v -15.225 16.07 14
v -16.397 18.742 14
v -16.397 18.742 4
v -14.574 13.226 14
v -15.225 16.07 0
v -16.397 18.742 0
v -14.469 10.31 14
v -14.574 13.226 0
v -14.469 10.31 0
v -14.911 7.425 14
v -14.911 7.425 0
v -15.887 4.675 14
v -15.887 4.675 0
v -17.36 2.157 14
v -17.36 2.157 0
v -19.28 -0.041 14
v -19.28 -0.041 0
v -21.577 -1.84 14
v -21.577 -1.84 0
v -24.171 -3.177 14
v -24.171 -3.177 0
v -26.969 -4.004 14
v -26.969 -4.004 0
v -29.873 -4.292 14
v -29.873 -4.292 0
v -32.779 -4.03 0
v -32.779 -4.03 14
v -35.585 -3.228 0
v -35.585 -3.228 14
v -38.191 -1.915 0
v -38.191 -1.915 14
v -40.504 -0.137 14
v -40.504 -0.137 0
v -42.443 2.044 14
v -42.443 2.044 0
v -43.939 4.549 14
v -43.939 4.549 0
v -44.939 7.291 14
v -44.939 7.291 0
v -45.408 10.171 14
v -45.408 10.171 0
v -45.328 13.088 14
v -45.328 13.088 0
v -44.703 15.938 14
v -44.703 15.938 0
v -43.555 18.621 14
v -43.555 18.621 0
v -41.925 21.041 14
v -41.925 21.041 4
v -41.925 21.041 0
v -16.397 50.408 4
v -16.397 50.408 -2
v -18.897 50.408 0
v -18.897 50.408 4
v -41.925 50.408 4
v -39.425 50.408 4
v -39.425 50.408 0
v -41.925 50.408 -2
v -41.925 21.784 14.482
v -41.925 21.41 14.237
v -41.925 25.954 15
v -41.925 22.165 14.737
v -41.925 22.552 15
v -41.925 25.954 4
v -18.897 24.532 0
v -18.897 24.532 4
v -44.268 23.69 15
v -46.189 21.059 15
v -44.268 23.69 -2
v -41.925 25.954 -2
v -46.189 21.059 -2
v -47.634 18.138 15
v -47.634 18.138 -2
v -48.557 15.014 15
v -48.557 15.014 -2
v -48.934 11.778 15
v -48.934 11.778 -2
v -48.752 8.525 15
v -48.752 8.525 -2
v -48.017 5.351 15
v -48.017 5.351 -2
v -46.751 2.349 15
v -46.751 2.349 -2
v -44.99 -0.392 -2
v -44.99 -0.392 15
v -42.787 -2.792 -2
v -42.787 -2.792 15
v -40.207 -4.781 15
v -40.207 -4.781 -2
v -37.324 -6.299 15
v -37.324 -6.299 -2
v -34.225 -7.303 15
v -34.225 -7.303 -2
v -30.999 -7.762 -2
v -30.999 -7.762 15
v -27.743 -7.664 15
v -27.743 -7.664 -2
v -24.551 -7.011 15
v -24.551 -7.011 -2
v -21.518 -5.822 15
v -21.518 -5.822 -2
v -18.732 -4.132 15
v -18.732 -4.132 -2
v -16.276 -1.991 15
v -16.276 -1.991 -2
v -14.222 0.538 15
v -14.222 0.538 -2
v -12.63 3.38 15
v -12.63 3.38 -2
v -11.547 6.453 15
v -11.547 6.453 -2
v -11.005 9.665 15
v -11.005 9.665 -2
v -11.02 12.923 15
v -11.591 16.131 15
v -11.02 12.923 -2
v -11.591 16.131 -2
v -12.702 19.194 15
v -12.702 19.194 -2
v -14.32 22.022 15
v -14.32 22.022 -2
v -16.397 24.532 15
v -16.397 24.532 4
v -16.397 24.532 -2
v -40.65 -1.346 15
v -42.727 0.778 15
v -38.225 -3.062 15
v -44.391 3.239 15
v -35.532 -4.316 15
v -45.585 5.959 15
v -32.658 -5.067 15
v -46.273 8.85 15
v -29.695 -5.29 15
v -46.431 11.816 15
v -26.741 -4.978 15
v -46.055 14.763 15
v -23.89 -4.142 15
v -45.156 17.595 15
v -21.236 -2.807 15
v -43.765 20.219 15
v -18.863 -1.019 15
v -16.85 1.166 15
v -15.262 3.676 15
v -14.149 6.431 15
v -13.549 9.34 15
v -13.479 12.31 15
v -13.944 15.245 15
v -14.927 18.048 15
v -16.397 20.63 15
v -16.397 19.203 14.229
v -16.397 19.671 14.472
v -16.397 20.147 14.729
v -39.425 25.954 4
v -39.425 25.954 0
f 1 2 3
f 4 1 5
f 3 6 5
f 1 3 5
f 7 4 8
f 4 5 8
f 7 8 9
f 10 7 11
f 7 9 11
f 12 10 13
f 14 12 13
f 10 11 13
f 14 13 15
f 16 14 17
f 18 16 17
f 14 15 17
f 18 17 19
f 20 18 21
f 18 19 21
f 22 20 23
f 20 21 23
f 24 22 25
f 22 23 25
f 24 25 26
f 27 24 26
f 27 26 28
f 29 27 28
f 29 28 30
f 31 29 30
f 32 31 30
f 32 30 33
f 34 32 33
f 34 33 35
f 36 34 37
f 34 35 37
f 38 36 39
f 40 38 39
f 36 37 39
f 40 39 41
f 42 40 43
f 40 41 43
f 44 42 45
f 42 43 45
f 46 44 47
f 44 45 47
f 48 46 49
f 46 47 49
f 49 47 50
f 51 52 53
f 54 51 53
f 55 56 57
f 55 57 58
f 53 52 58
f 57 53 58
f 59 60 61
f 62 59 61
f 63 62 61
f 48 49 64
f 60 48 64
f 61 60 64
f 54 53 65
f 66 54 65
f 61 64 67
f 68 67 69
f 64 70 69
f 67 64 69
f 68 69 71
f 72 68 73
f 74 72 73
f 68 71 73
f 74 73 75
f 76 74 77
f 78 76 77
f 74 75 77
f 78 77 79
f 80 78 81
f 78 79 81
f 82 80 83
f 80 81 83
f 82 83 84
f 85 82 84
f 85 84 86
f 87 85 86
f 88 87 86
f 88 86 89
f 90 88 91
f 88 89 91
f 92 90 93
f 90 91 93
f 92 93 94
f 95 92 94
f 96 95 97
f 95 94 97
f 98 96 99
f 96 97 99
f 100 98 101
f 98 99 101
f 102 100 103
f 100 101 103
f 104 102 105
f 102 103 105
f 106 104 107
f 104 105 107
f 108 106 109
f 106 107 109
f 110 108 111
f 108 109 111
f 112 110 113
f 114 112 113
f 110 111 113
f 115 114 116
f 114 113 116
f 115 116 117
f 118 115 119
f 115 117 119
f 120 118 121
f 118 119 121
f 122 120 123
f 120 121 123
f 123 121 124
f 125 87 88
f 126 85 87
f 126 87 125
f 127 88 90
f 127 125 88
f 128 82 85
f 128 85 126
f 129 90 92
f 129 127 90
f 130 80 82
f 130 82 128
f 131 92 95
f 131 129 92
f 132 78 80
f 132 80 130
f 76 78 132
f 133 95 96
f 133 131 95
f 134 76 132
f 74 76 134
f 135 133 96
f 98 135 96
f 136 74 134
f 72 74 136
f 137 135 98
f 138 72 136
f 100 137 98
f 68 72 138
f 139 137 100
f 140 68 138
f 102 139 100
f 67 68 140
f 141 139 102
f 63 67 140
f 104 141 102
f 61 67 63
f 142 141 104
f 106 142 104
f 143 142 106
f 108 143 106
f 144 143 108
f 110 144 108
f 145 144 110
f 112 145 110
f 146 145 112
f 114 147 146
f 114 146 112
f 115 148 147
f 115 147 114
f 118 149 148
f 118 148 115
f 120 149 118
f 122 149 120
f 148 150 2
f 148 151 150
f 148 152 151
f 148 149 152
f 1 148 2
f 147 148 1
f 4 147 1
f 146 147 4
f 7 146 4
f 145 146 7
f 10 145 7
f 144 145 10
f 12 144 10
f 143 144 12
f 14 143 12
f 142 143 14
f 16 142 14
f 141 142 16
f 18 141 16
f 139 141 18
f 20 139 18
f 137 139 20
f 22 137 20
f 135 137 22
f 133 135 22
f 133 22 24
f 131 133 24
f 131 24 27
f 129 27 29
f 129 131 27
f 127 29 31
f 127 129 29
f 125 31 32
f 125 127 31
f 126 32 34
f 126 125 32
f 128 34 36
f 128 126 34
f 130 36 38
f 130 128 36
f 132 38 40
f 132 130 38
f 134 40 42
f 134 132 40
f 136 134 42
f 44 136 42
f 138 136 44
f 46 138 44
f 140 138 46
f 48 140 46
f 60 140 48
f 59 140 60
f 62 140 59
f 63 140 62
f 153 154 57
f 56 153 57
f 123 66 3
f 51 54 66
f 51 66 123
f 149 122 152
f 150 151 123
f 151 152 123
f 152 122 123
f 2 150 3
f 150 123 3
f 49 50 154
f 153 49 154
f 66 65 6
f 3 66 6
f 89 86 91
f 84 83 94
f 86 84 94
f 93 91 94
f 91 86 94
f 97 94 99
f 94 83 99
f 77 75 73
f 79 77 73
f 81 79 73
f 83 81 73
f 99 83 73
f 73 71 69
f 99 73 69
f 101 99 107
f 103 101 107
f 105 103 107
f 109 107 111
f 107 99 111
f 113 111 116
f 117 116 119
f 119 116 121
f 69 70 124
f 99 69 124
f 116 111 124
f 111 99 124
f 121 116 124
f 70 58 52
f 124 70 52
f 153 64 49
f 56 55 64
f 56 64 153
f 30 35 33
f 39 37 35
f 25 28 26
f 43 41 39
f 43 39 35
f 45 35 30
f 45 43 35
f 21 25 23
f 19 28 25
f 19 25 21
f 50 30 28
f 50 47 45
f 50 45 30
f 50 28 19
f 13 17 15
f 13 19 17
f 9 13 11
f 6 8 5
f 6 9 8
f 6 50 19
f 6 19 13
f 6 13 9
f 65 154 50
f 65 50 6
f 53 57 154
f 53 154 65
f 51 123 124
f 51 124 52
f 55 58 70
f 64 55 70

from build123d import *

# Parameters (mm, degrees)
F1_DEPTH = 2
F2_DEPTH = 15
F4_DEPTH = 4
F5_SIZE  = 1


with BuildPart() as f1:
    # F0 (on Top) → F1 (new body)
    with BuildSketch(Plane.XY):
        with BuildLine():
            Line((-41.924741, 25.953611), (-41.924741, 21.040638))
            ThreePointArc((-41.924741, 21.040638), (-31.332281, -4.229339), (-16.396854, 18.742492))
            Line((-16.396854, 18.742492), (-16.396854, 24.531709))
            Line((-16.396854, 24.531709), (-16.396854, 50.408155))
            Line((-16.396854, 50.408155), (-41.924741, 50.408155))
            Line((-41.924741, 50.408155), (-41.924741, 25.953611))
        make_face()
        with BuildLine():
            ThreePointArc((-16.396854, 18.742492), (-31.332281, -4.229339), (-41.924741, 21.040638))
            Line((-41.924741, 21.040638), (-41.924741, 25.953611))
            ThreePointArc((-41.924741, 25.953611), (-30.999175, -7.762364), (-16.396854, 24.531709))
            Line((-16.396854, 24.531709), (-16.396854, 18.742492))
        make_face()
    extrude(amount=-F1_DEPTH)

    # F0 (on Top) → F2 (join)
    with BuildSketch(Plane.XY):
        with BuildLine():
            ThreePointArc((-16.396854, 18.742492), (-31.332281, -4.229339), (-41.924741, 21.040638))
            Line((-41.924741, 21.040638), (-41.924741, 25.953611))
            ThreePointArc((-41.924741, 25.953611), (-30.999175, -7.762364), (-16.396854, 24.531709))
            Line((-16.396854, 24.531709), (-16.396854, 18.742492))
        make_face()
    extrude(amount=F2_DEPTH)

    # F3 (on Top) → F4 (join)
    with BuildSketch(Plane.XY):
        Polygon((-39.424741, 47.908155), (-39.424741, 50.408155), (-41.924741, 50.408155), (-41.924741, 25.953611), (-41.924741, 21.040638), (-39.424741, 25.953611), align=None)
        Polygon((-16.396854, 24.531709), (-16.396854, 50.408155), (-18.896854, 50.408155), (-18.896854, 47.908155), (-18.896854, 24.531709), (-16.396854, 18.742492), align=None)
    extrude(amount=F4_DEPTH)

    # F5
    f5_edges = [f1.edges().sort_by_distance(p)[0] for p in [
        (-31.332281, -4.229339, 15),
    ]]
    chamfer(f5_edges, length=F5_SIZE)


solid = f1.part
